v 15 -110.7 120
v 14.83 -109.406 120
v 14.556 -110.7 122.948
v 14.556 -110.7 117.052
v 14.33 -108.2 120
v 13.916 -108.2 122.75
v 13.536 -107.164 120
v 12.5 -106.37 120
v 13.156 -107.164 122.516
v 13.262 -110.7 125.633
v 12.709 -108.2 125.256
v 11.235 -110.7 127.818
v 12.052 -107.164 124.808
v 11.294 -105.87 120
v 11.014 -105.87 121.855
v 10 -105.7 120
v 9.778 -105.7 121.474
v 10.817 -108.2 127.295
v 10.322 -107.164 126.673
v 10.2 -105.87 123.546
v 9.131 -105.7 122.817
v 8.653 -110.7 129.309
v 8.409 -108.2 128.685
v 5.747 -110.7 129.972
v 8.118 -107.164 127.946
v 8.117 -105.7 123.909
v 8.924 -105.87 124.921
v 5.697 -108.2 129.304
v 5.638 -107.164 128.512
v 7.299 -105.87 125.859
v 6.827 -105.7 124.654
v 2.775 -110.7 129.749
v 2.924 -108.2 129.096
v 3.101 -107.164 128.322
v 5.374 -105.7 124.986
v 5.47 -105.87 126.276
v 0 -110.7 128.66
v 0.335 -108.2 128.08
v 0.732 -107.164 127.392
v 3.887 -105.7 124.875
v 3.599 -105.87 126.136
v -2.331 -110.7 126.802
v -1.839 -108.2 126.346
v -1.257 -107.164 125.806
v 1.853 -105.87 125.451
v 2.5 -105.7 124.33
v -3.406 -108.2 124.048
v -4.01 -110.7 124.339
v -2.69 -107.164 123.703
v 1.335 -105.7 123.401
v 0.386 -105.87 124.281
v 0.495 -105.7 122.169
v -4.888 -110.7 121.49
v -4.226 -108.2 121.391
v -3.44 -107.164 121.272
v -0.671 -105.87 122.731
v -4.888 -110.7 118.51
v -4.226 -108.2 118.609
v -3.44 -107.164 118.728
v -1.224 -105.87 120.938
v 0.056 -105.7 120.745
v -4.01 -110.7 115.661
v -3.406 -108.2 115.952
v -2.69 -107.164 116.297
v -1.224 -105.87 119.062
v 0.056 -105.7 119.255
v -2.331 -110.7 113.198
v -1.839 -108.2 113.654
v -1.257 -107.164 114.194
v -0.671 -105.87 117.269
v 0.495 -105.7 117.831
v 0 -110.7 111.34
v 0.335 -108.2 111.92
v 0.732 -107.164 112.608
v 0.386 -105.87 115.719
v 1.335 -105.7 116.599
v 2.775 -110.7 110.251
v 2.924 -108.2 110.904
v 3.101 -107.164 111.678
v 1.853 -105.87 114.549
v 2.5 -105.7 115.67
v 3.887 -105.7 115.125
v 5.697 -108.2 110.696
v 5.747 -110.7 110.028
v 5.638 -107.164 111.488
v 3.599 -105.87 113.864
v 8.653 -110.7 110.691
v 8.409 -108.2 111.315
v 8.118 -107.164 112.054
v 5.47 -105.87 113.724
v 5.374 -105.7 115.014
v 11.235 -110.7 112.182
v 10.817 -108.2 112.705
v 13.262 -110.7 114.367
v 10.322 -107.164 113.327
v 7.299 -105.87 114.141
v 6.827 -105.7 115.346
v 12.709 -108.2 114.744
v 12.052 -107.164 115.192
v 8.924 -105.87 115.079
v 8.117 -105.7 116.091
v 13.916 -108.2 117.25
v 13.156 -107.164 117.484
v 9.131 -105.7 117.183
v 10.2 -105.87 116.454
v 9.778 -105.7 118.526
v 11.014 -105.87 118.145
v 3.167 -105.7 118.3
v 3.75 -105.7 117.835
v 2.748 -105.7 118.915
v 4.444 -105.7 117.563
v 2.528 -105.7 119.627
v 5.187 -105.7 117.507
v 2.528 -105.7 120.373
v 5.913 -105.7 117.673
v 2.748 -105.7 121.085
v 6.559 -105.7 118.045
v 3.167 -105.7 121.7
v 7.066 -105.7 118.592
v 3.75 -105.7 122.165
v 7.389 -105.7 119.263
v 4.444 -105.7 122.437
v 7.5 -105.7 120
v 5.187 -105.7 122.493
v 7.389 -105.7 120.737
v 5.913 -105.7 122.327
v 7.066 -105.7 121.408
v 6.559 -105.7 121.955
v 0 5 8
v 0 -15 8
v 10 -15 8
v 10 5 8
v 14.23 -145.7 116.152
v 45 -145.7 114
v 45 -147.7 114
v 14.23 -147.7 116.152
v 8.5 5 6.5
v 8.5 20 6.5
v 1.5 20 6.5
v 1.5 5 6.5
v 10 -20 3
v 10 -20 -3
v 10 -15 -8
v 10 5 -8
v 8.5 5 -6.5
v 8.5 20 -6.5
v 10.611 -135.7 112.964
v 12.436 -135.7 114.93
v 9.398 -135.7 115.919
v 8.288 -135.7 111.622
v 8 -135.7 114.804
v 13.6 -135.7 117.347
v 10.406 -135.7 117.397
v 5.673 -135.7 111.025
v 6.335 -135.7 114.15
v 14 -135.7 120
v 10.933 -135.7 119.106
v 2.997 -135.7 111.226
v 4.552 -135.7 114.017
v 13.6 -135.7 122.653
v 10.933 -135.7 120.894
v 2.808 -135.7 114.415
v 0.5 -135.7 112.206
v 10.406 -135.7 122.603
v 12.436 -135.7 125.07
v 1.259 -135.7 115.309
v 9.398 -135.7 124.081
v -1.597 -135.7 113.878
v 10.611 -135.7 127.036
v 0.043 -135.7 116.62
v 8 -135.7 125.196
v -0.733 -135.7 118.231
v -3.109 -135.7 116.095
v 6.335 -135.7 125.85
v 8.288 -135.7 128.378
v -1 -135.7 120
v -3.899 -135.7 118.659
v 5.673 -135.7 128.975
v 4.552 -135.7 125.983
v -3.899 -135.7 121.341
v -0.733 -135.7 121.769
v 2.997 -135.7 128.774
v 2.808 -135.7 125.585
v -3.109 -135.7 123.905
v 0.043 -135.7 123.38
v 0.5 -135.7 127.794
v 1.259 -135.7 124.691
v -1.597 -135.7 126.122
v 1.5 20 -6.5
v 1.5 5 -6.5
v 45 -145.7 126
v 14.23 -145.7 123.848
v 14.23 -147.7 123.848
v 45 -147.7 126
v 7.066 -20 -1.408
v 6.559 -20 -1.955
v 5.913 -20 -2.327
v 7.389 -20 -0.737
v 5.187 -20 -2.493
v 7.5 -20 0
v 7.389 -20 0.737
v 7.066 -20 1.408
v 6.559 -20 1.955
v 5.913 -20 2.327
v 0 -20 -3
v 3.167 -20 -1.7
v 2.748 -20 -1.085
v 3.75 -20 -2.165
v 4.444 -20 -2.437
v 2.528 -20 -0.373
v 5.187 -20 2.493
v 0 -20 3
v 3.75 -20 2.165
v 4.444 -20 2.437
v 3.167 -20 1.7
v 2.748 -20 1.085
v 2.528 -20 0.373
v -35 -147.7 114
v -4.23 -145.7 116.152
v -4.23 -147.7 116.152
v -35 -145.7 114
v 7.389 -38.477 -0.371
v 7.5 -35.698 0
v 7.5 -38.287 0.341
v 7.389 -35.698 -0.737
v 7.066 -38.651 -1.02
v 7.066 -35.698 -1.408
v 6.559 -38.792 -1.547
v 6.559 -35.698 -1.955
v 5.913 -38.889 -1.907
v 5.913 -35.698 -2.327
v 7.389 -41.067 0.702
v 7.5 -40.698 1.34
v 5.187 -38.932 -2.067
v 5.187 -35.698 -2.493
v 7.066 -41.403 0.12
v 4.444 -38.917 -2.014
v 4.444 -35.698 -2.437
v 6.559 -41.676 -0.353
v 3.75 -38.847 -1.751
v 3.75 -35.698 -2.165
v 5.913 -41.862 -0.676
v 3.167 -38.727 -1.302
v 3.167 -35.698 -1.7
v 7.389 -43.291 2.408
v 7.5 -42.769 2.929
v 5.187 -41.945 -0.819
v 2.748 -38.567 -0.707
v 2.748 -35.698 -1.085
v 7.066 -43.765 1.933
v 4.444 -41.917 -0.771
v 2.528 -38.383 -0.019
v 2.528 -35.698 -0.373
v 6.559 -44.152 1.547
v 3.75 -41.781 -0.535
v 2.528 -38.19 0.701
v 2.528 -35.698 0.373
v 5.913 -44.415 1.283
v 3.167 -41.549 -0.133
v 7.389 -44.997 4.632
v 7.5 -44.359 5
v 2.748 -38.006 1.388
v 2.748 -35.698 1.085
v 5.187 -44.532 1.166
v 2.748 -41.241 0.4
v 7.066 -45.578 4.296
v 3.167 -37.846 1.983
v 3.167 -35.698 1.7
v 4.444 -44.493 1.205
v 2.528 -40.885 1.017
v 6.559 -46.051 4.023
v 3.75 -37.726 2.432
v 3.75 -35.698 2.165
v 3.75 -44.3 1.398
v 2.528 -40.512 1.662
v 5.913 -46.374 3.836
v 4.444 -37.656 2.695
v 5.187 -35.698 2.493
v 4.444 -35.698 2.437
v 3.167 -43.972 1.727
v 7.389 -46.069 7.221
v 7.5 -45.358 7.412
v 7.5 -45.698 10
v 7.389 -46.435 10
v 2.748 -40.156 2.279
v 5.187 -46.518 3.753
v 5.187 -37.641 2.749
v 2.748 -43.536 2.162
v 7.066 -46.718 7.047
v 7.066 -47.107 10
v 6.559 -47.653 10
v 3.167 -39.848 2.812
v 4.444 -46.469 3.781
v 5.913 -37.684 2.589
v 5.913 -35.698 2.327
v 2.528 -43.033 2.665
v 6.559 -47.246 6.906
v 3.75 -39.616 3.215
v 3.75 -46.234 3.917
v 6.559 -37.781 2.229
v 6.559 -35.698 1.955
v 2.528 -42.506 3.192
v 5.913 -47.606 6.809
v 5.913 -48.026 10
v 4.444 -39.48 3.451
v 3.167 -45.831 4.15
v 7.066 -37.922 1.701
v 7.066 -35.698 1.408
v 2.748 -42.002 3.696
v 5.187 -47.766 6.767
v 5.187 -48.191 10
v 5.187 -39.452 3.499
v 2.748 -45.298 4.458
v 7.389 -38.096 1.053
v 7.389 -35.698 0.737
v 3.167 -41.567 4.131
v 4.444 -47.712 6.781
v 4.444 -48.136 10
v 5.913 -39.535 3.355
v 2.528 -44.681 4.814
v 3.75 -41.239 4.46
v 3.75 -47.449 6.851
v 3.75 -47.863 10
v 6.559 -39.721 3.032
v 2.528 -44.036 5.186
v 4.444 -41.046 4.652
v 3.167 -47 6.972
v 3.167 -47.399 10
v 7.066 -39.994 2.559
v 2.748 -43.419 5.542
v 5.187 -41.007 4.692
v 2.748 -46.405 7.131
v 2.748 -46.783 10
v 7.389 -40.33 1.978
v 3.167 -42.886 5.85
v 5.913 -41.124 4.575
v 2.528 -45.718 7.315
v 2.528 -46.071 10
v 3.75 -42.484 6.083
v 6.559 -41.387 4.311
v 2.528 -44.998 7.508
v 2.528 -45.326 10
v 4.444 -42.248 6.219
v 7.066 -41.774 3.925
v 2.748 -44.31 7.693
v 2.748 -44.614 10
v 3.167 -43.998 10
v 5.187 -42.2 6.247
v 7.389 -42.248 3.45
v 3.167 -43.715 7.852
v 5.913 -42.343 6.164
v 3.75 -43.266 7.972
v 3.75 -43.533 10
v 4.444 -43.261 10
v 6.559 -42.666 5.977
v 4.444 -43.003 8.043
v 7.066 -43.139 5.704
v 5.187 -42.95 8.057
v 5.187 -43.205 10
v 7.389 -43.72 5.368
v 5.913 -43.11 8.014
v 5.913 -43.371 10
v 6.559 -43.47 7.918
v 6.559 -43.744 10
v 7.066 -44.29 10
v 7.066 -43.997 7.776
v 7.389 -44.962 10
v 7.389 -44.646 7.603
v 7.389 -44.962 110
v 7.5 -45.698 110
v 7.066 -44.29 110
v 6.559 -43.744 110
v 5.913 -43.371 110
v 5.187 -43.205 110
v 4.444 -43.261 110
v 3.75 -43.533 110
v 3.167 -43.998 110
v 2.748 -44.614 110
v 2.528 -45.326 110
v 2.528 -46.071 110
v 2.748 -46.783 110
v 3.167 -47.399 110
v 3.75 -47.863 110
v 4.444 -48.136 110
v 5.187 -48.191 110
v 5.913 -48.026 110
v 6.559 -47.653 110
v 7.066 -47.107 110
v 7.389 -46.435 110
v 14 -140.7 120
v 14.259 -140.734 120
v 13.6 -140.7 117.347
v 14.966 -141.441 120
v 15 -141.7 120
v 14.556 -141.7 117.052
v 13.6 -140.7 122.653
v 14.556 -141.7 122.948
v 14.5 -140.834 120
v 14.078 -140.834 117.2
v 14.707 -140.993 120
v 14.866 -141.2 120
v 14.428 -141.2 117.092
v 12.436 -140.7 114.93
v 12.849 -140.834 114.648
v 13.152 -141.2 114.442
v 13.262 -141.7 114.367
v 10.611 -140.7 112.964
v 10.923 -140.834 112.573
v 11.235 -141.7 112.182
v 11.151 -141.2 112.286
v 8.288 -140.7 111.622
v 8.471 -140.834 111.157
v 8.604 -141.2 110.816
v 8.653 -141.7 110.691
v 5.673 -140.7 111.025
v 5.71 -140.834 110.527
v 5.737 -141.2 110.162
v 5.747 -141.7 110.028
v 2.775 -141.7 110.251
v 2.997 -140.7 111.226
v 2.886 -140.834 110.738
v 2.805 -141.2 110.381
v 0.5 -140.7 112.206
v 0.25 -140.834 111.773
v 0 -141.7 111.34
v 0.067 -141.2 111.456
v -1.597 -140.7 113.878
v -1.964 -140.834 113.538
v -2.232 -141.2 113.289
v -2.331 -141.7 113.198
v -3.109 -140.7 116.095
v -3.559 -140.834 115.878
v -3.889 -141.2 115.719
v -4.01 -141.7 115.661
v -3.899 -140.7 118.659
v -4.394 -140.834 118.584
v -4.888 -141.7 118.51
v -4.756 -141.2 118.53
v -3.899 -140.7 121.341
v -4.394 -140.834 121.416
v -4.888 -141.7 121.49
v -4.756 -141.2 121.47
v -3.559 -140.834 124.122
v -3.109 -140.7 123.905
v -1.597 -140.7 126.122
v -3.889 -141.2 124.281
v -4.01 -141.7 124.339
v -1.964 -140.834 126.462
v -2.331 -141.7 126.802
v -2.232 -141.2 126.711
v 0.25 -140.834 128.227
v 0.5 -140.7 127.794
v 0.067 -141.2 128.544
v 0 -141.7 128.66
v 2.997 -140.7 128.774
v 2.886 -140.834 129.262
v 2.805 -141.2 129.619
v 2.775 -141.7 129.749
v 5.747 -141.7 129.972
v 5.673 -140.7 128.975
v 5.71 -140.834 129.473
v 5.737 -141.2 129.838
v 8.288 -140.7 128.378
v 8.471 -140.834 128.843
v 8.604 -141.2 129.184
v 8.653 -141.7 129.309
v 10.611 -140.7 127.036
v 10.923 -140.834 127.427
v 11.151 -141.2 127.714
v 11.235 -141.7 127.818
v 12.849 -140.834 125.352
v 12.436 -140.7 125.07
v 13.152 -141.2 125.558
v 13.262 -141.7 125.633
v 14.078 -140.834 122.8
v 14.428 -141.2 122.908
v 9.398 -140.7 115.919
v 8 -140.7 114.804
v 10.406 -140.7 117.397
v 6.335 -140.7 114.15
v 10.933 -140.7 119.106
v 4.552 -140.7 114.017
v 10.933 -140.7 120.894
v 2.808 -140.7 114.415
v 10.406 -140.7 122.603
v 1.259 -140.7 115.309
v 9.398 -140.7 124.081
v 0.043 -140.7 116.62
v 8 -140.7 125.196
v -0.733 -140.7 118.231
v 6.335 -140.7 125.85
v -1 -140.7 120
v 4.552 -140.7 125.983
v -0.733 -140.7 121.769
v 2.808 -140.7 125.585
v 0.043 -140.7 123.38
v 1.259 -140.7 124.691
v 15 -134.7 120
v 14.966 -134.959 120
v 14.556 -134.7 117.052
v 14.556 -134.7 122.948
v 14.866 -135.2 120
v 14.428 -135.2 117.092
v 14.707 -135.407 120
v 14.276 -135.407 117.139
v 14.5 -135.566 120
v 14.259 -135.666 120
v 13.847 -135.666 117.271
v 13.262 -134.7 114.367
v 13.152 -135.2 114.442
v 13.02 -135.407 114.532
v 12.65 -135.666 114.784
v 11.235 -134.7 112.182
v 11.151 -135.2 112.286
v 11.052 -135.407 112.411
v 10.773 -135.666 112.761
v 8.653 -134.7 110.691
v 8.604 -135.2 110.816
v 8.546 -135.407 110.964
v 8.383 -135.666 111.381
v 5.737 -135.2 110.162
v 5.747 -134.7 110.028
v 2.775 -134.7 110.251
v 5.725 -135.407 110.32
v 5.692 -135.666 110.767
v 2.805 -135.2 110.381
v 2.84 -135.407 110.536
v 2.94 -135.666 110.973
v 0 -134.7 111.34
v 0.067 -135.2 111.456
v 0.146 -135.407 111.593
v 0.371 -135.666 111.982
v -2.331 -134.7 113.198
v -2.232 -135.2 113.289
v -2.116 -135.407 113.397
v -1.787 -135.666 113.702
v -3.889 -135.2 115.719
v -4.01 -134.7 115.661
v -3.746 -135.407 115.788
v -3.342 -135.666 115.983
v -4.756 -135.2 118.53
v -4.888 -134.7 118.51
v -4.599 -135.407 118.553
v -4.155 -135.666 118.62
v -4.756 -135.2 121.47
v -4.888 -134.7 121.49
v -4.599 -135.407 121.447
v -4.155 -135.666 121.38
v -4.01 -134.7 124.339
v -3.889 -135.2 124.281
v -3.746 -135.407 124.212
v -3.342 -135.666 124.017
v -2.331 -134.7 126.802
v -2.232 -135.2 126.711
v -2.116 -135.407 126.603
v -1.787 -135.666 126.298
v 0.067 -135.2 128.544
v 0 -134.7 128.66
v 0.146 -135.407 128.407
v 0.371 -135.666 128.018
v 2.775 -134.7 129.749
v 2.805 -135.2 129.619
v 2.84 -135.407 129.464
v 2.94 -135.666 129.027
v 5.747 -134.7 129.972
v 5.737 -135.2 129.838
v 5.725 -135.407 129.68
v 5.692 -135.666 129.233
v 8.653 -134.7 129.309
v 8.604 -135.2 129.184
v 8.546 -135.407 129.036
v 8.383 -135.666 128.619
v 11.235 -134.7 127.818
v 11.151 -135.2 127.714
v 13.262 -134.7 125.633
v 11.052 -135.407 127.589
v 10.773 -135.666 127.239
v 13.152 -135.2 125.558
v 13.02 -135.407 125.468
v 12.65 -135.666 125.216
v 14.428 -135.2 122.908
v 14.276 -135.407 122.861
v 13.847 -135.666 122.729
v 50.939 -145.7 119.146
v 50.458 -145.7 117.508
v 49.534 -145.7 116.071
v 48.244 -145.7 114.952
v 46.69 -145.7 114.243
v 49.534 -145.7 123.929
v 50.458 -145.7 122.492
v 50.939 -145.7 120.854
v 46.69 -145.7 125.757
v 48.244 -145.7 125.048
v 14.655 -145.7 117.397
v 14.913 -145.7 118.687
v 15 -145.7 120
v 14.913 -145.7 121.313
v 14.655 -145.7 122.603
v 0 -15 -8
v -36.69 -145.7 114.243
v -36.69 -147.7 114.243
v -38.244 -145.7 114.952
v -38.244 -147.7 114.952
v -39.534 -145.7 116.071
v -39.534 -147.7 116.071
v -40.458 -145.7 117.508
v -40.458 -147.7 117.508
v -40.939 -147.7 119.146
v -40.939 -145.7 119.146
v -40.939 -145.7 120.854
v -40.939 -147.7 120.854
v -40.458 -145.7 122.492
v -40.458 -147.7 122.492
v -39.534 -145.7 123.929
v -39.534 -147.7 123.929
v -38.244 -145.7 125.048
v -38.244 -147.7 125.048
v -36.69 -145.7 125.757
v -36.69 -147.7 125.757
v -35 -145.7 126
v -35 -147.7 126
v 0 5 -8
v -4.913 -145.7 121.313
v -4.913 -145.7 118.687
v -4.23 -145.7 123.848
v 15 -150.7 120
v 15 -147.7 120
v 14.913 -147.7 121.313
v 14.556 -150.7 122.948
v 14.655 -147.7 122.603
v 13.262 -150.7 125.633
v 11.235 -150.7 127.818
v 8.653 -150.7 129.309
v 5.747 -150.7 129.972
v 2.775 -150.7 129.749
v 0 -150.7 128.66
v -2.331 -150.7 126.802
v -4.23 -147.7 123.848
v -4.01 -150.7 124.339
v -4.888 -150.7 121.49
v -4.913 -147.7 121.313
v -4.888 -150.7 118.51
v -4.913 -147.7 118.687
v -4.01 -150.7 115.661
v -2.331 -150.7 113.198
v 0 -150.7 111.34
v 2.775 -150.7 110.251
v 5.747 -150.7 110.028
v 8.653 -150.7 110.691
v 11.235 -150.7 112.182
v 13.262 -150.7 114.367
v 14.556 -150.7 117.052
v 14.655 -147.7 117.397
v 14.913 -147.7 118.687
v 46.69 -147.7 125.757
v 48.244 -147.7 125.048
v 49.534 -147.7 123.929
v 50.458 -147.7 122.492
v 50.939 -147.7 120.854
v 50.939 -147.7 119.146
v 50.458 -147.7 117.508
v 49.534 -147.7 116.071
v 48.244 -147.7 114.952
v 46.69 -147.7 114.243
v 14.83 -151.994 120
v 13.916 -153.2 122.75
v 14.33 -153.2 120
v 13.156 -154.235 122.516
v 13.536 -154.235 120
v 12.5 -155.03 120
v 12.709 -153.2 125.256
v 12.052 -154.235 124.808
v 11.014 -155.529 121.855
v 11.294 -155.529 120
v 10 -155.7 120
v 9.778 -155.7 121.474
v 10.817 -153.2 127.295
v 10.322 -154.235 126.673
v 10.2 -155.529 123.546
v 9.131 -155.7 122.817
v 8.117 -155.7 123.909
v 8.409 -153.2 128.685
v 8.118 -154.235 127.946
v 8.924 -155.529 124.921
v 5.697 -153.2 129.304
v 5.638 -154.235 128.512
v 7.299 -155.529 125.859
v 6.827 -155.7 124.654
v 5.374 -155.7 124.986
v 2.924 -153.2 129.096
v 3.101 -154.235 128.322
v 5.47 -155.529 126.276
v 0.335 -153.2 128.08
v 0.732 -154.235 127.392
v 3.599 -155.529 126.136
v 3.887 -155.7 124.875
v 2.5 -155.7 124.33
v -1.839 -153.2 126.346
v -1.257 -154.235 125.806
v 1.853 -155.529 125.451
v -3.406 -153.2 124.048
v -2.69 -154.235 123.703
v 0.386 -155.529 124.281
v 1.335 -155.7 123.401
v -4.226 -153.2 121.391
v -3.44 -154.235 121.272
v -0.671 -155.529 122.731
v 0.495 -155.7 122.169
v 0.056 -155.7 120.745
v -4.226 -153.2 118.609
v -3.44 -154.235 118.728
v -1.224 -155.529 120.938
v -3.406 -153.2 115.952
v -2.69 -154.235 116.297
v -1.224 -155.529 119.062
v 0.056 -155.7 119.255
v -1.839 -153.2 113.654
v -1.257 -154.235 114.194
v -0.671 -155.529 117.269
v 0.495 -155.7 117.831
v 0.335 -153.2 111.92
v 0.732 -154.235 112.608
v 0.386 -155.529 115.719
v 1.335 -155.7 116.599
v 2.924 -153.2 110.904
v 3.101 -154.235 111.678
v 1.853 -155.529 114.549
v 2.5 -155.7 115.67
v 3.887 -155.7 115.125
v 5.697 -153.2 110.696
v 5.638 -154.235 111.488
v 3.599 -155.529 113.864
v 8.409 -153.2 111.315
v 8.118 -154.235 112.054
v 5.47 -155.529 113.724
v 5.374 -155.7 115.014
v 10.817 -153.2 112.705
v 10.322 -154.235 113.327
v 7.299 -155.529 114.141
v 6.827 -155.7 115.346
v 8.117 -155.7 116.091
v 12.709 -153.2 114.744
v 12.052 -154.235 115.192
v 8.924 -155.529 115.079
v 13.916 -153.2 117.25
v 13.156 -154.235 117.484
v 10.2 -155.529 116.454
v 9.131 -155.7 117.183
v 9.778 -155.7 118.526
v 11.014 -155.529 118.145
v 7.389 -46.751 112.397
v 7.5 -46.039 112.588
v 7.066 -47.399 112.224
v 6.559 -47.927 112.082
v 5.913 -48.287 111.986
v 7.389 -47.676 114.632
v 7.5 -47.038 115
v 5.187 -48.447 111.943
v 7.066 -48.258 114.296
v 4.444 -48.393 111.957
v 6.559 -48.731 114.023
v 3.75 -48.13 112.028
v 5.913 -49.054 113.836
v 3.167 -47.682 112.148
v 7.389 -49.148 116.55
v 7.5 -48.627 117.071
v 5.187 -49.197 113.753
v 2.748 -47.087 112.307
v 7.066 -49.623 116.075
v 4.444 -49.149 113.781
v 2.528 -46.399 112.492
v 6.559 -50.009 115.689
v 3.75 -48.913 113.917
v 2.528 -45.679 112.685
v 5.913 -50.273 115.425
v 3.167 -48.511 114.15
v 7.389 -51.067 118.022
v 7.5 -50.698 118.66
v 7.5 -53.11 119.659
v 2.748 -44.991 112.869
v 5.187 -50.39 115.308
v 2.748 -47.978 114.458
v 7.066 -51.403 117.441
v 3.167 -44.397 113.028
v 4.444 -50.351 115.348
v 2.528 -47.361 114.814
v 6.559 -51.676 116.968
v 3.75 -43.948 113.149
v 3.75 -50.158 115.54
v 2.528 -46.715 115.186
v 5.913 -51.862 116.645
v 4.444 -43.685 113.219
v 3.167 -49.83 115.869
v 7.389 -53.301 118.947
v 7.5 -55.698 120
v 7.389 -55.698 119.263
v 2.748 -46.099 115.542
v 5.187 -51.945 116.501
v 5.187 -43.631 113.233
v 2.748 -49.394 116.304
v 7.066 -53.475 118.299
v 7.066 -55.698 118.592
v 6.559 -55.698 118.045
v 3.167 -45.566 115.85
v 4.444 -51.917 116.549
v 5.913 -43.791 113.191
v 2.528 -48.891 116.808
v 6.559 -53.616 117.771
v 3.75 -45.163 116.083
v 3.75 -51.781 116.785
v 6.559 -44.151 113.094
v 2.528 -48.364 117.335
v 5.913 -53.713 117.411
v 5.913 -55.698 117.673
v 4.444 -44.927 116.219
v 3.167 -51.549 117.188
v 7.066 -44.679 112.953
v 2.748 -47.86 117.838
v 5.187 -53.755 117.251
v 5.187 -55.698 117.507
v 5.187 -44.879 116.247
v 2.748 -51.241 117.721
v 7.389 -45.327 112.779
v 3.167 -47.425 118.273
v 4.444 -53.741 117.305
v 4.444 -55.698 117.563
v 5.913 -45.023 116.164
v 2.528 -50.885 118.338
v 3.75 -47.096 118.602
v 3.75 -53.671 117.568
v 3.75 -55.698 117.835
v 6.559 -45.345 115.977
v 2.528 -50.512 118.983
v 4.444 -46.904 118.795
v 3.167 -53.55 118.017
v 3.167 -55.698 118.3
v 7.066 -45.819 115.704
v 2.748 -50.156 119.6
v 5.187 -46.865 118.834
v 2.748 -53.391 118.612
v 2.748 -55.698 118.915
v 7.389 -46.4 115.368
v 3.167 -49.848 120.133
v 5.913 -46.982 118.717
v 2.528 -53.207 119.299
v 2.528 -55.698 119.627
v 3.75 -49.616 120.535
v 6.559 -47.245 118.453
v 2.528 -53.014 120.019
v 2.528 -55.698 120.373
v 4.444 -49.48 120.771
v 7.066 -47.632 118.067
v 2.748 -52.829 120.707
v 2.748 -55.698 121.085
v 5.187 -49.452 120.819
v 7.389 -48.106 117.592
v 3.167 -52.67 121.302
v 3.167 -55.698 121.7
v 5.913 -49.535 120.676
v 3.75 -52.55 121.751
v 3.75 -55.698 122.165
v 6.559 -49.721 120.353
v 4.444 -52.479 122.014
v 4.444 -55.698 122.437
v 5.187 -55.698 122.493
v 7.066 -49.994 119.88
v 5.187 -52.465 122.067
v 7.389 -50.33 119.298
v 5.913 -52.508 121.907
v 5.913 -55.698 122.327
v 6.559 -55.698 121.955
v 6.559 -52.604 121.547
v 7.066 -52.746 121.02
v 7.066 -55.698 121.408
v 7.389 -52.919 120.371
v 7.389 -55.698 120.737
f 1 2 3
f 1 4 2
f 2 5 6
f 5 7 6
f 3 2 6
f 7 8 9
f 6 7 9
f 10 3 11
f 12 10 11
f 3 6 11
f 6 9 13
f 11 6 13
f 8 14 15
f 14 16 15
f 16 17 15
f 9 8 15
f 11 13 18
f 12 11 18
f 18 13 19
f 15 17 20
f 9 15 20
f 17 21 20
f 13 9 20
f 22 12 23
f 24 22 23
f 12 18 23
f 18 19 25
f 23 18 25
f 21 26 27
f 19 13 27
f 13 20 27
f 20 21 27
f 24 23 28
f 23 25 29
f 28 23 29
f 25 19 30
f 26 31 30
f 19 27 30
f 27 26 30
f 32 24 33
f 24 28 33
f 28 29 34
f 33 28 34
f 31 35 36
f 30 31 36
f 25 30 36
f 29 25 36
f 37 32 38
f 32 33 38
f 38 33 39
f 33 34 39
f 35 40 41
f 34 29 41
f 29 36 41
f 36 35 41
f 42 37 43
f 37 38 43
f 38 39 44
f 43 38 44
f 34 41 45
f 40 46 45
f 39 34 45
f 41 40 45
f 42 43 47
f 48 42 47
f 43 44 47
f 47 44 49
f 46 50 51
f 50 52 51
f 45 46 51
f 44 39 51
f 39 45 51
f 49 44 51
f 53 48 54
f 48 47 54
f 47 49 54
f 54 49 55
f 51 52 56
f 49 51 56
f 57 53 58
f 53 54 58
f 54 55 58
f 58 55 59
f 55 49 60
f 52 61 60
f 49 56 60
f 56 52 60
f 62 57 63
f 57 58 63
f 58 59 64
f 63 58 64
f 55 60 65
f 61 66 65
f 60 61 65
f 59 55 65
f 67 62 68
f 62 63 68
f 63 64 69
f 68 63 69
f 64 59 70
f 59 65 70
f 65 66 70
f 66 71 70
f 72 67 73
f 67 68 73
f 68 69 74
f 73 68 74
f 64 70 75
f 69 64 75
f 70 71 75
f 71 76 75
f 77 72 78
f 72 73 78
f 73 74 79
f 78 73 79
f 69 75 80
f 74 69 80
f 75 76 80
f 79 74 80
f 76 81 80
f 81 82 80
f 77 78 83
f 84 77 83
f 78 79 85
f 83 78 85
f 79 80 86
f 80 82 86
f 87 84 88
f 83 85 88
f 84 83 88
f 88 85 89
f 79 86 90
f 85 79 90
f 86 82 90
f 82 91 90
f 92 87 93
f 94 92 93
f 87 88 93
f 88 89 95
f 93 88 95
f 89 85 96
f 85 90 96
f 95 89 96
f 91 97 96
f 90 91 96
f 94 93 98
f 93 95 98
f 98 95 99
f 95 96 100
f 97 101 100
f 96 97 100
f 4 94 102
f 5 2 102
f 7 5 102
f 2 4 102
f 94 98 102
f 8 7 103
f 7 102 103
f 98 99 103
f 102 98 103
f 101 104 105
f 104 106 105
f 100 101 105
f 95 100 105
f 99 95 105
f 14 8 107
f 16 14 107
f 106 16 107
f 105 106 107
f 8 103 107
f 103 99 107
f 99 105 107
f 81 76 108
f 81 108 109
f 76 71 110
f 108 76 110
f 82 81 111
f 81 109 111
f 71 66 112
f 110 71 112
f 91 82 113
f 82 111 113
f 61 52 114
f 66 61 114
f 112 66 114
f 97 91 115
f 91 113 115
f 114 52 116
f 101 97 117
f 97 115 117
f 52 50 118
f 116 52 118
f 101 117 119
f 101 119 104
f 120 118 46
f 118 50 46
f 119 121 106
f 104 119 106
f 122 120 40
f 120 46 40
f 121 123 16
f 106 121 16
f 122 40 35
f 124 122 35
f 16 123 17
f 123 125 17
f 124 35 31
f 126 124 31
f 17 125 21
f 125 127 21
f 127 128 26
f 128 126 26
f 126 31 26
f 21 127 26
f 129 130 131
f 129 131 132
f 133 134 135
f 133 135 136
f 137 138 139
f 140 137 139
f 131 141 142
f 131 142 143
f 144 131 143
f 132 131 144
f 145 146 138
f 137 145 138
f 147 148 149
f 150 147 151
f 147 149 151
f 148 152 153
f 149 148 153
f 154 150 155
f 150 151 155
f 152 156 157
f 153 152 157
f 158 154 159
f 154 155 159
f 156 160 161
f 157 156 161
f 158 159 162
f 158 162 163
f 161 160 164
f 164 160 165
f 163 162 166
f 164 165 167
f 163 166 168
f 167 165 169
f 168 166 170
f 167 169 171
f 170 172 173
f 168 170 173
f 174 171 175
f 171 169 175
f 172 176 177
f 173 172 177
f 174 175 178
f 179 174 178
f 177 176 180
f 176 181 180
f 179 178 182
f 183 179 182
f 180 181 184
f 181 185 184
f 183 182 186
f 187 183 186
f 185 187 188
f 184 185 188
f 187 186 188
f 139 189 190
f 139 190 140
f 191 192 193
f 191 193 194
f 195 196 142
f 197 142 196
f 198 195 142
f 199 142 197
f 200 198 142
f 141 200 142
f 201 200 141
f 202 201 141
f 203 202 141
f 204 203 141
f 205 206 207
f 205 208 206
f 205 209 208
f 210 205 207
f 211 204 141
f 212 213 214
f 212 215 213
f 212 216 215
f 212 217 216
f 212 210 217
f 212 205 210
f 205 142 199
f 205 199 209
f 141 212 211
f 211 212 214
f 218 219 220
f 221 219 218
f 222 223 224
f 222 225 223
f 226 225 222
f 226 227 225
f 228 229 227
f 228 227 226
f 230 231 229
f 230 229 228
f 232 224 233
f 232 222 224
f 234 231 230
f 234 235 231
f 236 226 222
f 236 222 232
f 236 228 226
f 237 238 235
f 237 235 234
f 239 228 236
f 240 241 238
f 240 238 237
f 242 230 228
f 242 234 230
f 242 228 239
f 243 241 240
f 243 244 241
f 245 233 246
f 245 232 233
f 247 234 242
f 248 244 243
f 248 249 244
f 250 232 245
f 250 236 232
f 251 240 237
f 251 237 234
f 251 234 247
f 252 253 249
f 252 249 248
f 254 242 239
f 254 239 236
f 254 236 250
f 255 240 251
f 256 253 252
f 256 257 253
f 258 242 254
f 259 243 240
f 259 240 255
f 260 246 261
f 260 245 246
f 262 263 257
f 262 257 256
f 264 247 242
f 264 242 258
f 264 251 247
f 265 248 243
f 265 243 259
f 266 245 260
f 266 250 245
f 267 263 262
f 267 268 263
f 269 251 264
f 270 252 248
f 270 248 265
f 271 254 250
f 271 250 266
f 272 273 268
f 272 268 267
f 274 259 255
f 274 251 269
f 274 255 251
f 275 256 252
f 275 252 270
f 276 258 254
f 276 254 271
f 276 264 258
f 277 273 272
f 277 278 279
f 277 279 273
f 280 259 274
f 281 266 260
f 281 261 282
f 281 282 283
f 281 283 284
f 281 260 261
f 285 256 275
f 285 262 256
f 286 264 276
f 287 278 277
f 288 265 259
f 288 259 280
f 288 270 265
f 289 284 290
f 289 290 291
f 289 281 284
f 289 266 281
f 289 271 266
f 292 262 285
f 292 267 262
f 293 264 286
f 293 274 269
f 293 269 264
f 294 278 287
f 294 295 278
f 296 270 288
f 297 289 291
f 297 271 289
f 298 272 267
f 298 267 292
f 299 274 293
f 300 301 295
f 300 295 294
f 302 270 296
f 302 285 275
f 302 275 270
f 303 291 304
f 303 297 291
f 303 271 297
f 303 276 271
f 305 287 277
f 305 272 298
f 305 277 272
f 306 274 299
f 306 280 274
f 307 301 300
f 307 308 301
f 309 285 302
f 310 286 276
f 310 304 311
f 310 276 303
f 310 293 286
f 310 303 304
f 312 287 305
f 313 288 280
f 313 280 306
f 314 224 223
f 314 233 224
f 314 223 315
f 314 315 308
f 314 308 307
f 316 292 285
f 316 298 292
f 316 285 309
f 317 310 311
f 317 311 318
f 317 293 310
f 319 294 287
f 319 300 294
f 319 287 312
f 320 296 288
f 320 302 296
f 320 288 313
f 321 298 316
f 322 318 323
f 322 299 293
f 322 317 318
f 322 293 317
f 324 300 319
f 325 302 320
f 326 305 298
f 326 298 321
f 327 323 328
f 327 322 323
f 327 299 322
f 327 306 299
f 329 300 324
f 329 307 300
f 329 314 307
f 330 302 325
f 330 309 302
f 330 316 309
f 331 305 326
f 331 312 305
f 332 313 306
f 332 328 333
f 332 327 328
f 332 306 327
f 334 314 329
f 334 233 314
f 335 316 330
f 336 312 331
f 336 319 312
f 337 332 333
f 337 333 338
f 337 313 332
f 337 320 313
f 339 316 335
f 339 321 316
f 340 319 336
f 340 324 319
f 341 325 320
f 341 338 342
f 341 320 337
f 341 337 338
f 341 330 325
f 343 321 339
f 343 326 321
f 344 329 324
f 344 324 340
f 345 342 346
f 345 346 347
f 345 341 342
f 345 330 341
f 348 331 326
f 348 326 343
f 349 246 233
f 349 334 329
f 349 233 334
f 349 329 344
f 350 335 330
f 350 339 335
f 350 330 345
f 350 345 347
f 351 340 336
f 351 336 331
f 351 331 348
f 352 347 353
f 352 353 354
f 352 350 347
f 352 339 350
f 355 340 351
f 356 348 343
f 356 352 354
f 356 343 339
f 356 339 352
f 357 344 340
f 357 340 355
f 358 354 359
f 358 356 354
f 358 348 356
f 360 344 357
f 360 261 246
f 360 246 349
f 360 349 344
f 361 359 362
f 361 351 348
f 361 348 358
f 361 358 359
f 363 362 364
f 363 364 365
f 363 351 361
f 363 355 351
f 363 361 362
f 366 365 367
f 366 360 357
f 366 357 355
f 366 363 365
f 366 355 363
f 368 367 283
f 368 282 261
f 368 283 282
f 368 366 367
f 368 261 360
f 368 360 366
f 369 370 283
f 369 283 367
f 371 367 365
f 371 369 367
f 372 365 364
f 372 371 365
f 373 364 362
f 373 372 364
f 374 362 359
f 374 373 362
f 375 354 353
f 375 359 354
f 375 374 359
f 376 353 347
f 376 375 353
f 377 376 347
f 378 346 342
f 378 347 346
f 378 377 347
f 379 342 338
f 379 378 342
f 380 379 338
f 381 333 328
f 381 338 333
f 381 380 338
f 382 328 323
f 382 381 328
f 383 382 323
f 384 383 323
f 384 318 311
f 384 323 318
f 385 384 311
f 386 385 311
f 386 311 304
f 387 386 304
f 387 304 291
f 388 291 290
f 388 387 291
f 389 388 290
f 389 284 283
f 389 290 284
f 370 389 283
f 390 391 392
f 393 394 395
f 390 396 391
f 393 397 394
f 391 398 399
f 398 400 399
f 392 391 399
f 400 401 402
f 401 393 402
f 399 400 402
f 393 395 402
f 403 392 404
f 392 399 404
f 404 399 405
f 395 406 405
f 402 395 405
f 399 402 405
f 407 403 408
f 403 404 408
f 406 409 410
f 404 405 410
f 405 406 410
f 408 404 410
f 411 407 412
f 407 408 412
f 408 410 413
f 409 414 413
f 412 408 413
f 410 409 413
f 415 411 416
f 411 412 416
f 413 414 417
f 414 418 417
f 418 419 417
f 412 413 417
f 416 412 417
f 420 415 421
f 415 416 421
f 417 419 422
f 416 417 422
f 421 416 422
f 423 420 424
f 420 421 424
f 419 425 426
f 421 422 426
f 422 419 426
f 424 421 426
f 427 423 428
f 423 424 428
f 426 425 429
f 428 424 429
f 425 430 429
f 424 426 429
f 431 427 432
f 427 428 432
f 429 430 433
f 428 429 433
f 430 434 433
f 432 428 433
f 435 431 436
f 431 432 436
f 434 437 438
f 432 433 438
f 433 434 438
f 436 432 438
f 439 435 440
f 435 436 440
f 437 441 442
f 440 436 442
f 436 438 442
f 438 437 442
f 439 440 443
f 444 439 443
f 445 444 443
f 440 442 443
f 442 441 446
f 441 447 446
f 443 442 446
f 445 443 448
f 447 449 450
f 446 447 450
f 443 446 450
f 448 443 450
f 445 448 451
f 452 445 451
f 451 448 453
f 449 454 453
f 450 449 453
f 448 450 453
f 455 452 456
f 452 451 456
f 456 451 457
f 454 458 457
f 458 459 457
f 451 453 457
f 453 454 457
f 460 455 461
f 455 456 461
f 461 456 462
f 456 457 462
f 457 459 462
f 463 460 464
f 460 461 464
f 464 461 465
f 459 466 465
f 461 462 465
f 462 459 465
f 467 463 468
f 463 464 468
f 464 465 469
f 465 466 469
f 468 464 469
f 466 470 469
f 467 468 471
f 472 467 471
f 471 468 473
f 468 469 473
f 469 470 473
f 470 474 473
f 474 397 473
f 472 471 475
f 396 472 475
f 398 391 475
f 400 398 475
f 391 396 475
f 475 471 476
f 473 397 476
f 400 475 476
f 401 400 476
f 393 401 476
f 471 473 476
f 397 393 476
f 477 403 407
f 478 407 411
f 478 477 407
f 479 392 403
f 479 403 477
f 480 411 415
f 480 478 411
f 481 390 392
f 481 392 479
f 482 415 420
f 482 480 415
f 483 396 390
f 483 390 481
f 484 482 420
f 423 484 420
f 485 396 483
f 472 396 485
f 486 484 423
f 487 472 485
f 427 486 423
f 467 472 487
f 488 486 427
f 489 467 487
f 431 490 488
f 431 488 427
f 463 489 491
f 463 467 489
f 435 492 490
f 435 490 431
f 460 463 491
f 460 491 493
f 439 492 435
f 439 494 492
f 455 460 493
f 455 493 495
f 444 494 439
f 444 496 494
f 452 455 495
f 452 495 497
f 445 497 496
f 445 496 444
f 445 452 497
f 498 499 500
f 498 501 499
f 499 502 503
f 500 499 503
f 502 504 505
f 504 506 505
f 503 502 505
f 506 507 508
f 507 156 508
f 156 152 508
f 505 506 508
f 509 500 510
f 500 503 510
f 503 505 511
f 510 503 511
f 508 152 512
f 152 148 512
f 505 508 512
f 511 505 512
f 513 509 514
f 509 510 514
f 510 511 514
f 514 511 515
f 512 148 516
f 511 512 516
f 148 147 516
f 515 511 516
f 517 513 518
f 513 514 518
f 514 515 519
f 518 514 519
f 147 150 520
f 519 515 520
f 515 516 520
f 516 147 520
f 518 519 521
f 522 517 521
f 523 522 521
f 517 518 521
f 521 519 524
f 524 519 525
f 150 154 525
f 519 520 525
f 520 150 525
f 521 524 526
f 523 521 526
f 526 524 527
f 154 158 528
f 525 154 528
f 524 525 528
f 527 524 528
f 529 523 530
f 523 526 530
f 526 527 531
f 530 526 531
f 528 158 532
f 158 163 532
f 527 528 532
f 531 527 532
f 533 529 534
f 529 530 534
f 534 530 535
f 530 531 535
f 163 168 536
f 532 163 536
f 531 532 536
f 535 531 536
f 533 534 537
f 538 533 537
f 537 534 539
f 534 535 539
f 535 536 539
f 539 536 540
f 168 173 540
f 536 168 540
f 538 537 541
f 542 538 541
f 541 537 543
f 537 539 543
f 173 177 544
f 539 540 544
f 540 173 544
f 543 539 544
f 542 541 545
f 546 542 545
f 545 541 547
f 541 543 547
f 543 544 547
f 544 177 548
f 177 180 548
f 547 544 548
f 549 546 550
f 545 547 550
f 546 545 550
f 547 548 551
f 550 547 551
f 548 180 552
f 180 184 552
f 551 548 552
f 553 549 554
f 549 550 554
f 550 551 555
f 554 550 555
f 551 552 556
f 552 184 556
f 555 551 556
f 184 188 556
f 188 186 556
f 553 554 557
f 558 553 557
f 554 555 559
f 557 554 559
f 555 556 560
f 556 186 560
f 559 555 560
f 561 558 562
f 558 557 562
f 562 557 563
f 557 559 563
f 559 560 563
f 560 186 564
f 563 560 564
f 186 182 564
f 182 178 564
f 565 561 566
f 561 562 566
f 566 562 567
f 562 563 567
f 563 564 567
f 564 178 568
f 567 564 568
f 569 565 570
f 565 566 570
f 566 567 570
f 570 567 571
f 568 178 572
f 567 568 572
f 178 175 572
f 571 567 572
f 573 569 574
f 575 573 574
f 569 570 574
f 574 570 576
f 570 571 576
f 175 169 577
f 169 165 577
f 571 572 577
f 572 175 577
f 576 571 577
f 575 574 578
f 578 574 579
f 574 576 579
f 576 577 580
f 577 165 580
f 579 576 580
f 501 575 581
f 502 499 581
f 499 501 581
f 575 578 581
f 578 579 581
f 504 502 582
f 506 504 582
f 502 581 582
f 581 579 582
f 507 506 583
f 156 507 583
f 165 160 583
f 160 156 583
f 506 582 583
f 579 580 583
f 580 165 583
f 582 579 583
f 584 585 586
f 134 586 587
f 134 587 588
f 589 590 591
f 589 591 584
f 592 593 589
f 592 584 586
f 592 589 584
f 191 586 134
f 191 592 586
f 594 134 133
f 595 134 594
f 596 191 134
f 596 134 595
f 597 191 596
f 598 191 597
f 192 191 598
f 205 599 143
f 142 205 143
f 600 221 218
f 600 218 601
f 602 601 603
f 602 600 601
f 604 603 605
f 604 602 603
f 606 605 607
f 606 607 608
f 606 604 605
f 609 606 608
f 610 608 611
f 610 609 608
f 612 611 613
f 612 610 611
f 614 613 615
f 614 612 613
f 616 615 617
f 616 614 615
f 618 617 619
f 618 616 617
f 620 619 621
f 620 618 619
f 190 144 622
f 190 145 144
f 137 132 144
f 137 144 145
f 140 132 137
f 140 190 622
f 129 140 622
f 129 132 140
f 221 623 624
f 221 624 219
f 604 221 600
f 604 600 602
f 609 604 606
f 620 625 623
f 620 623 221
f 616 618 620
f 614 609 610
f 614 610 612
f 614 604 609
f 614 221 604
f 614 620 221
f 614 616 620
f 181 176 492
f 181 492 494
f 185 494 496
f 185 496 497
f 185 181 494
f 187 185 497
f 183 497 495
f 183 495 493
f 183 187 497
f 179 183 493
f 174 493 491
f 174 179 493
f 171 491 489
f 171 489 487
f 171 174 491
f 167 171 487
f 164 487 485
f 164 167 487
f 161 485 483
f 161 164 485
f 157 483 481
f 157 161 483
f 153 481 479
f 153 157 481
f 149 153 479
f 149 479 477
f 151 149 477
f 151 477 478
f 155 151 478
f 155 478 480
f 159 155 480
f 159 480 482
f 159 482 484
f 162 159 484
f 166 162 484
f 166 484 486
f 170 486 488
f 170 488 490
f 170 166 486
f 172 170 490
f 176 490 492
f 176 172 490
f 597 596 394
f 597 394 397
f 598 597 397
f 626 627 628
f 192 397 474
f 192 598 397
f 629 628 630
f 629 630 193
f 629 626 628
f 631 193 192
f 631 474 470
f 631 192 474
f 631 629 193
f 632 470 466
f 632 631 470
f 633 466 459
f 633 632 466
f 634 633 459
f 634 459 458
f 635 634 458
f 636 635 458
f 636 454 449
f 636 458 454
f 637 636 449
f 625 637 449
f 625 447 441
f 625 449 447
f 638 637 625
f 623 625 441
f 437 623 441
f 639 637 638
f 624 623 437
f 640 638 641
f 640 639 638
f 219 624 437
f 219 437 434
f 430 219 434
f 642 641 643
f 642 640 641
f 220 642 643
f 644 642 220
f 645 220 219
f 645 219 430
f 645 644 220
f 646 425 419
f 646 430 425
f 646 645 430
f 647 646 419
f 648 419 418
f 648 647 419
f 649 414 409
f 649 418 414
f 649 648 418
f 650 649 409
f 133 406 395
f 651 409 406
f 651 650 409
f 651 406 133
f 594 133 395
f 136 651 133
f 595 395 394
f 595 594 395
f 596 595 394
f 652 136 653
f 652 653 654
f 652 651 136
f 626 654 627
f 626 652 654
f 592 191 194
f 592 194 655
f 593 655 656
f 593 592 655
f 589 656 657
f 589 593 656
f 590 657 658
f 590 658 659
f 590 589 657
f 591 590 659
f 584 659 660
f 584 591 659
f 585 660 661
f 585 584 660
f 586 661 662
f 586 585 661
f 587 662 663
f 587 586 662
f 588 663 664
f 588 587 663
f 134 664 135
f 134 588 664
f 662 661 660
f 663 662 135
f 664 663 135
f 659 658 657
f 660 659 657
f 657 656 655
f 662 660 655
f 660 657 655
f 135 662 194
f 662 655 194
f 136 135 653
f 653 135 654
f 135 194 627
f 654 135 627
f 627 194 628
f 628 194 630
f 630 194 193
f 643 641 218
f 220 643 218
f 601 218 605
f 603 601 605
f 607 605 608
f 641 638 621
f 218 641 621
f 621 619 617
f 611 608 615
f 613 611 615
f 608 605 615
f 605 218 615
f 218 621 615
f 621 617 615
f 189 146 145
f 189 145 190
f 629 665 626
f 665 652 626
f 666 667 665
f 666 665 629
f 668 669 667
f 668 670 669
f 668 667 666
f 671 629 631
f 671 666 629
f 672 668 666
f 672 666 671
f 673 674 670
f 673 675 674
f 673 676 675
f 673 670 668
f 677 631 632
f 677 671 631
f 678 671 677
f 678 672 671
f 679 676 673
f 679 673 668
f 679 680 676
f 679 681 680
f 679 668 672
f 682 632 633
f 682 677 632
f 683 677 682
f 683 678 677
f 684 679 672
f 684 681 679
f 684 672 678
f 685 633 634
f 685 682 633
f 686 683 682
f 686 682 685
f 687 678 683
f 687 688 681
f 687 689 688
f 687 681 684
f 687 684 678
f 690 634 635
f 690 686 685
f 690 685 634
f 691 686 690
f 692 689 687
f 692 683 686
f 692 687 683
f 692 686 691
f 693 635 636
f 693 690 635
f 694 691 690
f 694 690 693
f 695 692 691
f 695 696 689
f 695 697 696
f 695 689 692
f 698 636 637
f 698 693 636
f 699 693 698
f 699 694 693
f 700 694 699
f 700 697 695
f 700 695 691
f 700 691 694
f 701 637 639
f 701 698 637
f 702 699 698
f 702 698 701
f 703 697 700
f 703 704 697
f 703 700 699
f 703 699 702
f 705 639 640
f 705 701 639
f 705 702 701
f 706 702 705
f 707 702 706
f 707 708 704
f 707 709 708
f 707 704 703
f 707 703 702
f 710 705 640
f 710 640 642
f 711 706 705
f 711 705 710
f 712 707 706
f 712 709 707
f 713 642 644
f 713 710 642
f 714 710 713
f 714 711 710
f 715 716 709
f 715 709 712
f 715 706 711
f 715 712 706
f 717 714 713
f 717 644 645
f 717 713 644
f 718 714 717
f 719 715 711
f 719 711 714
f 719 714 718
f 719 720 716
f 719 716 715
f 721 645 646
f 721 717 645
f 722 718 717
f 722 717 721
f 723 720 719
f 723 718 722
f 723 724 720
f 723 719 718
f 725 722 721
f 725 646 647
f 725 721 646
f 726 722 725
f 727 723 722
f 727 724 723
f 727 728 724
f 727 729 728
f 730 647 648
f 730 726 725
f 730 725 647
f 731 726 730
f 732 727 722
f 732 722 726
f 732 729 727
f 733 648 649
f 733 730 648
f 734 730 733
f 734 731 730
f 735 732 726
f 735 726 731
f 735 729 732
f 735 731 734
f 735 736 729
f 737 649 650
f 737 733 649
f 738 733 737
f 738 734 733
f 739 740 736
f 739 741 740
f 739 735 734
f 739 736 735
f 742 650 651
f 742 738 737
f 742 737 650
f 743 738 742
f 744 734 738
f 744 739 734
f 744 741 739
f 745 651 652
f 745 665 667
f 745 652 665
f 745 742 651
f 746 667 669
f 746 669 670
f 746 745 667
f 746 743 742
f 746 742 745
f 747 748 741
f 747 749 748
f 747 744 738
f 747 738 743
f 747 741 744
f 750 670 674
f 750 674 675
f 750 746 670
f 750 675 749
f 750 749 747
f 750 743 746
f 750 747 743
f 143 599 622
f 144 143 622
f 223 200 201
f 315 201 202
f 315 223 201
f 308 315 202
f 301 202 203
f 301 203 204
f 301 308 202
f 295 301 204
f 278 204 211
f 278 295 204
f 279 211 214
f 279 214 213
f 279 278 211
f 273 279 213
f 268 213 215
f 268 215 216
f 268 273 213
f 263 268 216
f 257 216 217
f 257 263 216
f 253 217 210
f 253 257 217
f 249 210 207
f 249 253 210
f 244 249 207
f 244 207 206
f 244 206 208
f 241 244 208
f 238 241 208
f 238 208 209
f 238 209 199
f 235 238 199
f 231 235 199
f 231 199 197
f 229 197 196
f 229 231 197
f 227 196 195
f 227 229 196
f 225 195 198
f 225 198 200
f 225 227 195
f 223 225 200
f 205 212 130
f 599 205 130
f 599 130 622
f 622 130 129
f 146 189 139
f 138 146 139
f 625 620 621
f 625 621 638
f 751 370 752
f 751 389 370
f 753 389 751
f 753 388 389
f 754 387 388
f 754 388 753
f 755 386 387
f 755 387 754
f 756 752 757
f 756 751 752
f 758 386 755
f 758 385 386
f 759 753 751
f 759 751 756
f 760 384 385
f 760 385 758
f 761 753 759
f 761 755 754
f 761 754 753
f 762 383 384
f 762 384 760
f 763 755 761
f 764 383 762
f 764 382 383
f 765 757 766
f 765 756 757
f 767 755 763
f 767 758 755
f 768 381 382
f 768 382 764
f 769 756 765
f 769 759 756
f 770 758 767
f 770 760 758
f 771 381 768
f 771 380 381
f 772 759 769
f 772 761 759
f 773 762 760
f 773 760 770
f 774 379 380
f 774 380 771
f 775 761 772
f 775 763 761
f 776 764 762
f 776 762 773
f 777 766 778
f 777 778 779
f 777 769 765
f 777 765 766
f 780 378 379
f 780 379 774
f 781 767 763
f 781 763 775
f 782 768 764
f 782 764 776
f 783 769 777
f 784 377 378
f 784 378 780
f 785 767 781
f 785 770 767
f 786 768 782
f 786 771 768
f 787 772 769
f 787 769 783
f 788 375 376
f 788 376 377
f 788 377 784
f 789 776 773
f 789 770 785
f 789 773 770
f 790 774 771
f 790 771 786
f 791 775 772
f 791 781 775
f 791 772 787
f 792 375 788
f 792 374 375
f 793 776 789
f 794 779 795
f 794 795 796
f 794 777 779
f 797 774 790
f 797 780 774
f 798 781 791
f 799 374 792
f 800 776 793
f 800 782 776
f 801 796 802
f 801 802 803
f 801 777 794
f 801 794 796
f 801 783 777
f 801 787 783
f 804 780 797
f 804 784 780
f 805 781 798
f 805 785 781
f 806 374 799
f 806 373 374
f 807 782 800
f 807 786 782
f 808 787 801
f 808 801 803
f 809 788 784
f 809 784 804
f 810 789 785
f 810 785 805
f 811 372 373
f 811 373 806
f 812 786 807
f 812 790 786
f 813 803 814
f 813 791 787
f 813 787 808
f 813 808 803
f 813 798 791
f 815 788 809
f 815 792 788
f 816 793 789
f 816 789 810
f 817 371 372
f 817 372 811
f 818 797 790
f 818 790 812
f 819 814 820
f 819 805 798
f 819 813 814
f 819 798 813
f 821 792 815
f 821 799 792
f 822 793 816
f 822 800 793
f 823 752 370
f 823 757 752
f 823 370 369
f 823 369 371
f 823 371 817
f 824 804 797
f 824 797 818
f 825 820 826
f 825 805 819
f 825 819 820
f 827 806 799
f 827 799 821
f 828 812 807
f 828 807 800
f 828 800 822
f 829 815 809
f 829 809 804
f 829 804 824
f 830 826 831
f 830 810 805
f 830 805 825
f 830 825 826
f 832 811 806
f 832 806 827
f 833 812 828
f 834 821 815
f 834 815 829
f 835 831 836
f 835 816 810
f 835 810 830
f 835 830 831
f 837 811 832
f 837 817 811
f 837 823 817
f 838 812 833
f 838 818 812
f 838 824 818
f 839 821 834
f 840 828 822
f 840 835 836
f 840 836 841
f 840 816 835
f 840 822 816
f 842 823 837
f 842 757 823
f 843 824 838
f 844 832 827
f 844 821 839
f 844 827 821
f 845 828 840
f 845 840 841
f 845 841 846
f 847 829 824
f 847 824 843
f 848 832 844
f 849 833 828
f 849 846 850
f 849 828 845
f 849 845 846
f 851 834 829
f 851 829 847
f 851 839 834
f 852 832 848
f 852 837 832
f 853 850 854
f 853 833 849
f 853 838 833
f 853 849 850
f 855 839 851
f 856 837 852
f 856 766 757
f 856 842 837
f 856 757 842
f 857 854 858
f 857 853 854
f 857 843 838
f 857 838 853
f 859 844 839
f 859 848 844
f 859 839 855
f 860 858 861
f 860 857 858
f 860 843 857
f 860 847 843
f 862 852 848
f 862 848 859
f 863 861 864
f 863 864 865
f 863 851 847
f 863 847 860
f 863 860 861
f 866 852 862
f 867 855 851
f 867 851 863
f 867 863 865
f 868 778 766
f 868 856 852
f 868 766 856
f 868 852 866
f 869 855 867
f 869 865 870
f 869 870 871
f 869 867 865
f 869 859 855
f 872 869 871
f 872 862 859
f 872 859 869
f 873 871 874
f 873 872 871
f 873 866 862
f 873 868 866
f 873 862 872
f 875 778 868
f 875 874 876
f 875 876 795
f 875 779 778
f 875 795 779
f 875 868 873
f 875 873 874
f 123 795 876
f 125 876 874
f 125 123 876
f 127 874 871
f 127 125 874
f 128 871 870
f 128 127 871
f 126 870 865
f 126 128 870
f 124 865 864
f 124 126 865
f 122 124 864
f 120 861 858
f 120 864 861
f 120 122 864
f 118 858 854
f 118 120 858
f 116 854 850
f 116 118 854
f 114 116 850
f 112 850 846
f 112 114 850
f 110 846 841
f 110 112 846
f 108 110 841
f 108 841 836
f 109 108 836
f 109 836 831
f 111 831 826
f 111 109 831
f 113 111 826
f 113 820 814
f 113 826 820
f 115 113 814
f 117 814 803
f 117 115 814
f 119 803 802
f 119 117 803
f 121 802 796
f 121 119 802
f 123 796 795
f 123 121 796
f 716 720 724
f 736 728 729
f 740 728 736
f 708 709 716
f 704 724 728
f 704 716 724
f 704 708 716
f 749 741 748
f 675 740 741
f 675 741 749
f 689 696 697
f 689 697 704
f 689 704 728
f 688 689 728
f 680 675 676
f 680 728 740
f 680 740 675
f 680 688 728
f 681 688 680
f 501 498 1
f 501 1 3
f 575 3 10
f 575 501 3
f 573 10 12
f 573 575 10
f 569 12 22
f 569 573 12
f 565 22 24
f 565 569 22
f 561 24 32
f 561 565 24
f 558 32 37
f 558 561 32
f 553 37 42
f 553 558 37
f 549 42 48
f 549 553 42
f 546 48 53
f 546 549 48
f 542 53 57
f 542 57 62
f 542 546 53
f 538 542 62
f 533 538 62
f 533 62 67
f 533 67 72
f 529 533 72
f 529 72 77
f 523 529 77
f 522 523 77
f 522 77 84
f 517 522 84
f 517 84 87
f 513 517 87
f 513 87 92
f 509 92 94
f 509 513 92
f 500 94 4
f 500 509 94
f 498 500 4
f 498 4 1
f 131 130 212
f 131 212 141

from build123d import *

# Parameters (mm, degrees)
F0_W      = 40
F0_H      = 16
F1_DEPTH  = 10
F3_R      = 2.5
F6_R      = 10
F7_DEPTH  = 50
F8_R      = 5
F9_SIZE   = 5
F10_W     = 10
F10_H     = 16
F10_W_2   = 7
F10_H_2   = 13
F11_DEPTH = 15
F13_R     = 10
F13_R_2   = 6
F14_DEPTH = 5
F15_R     = 1
F18_DEPTH = 2


with BuildPart() as f1:
    # F0 (on Right) → F1 (new body)
    with BuildSketch(Plane.YZ):
        Rectangle(F0_W, F0_H)
    extrude(amount=F1_DEPTH)

    # F5: sweep along a path in F4
    with BuildLine(Plane.YZ.offset(5)) as f5_path:
        Line((-19.998556003, 0), (-35.6984053552, 0))
        ThreePointArc((-35.6984053552, 0), (-42.7694731671, 2.9289321881), (-45.6984053552, 10))
        Line((-45.6984053552, 10), (-45.6984053552, 110))
        ThreePointArc((-45.6984053552, 110), (-48.6273375433, 117.0710678119), (-55.6984053552, 120))
        Line((-55.6984053552, 120), (-155.6984053552, 120))
    # F3 (on face) → F5 (sweep)
    with BuildSketch(Plane.XZ.offset(20)):
        with Locations((5, 0)):
            Circle(F3_R)
    sweep(path=f5_path.line)

    # F6 (on face) → F7 (join)
    with BuildSketch(Plane.XZ.offset(155.6998493522)):
        with Locations((5, 120)):
            Circle(F6_R)
    extrude(amount=-F7_DEPTH)

    # F8
    f8_edges = [f1.edges().sort_by_distance(p)[0] for p in [
        (-5, -105.699849, 120),
        (-5, -155.699849, 120),
    ]]
    fillet(f8_edges, radius=F8_R)

    # F9
    f9_edges = [f1.edges().sort_by_distance(p)[0] for p in [
        (5, -20, 8),
        (5, -20, -8),
    ]]
    chamfer(f9_edges, length=F9_SIZE)

    # F10 (on face) → F11 (cut)
    with BuildSketch(Plane(origin=(0, 20, 0), x_dir=(-1, 0, 0), z_dir=(0, 1, 0))):
        with Locations((-5, 0)):
            Rectangle(F10_W, F10_H)
        with Locations((-5, 0)):
            Rectangle(F10_W_2, F10_H_2, mode=Mode.SUBTRACT)
    extrude(amount=-F11_DEPTH, mode=Mode.SUBTRACT)

    # F13 (on offset) → F14 (cut)
    with BuildSketch(Plane(origin=(0, -135.6998493522, 0), x_dir=(-1, 0, 0), z_dir=(0, 1, 0))):
        with Locations((-5, 120)):
            Circle(F13_R)
        with Locations((-5, 120)):
            Circle(F13_R_2, mode=Mode.SUBTRACT)
    extrude(amount=-F14_DEPTH, mode=Mode.SUBTRACT)

    # F15
    f15_edges = [f1.edges().sort_by_distance(p)[0] for p in [
        (-5, -135.699849, 120),
        (-5, -140.699849, 120),
    ]]
    fillet(f15_edges, radius=F15_R)

    # F17 (on offset) → F18 (join)
    with BuildSketch(Plane(origin=(0, -145.6998493522, 0), x_dir=(-1, 0, 0), z_dir=(0, 1, 0))):
        with BuildLine():
            ThreePointArc((-0.1567504958, 123.5416005195), (1, 120), (-0.1567504958, 116.4583994805))
            Line((-0.1567504958, 116.4583994805), (35, 114))
            ThreePointArc((35, 114), (41, 120), (35, 126))
            Line((35, 126), (-0.1567504958, 123.5416005195))
        make_face()
        with BuildLine():
            Line((-45, 114), (-9.8432495042, 116.4583994805))
            ThreePointArc((-9.8432495042, 116.4583994805), (-11, 120), (-9.8432495042, 123.5416005195))
            Line((-9.8432495042, 123.5416005195), (-45, 126))
            ThreePointArc((-45, 126), (-51, 120), (-45, 114))
        make_face()
    extrude(amount=-F18_DEPTH)


solid = f1.part
